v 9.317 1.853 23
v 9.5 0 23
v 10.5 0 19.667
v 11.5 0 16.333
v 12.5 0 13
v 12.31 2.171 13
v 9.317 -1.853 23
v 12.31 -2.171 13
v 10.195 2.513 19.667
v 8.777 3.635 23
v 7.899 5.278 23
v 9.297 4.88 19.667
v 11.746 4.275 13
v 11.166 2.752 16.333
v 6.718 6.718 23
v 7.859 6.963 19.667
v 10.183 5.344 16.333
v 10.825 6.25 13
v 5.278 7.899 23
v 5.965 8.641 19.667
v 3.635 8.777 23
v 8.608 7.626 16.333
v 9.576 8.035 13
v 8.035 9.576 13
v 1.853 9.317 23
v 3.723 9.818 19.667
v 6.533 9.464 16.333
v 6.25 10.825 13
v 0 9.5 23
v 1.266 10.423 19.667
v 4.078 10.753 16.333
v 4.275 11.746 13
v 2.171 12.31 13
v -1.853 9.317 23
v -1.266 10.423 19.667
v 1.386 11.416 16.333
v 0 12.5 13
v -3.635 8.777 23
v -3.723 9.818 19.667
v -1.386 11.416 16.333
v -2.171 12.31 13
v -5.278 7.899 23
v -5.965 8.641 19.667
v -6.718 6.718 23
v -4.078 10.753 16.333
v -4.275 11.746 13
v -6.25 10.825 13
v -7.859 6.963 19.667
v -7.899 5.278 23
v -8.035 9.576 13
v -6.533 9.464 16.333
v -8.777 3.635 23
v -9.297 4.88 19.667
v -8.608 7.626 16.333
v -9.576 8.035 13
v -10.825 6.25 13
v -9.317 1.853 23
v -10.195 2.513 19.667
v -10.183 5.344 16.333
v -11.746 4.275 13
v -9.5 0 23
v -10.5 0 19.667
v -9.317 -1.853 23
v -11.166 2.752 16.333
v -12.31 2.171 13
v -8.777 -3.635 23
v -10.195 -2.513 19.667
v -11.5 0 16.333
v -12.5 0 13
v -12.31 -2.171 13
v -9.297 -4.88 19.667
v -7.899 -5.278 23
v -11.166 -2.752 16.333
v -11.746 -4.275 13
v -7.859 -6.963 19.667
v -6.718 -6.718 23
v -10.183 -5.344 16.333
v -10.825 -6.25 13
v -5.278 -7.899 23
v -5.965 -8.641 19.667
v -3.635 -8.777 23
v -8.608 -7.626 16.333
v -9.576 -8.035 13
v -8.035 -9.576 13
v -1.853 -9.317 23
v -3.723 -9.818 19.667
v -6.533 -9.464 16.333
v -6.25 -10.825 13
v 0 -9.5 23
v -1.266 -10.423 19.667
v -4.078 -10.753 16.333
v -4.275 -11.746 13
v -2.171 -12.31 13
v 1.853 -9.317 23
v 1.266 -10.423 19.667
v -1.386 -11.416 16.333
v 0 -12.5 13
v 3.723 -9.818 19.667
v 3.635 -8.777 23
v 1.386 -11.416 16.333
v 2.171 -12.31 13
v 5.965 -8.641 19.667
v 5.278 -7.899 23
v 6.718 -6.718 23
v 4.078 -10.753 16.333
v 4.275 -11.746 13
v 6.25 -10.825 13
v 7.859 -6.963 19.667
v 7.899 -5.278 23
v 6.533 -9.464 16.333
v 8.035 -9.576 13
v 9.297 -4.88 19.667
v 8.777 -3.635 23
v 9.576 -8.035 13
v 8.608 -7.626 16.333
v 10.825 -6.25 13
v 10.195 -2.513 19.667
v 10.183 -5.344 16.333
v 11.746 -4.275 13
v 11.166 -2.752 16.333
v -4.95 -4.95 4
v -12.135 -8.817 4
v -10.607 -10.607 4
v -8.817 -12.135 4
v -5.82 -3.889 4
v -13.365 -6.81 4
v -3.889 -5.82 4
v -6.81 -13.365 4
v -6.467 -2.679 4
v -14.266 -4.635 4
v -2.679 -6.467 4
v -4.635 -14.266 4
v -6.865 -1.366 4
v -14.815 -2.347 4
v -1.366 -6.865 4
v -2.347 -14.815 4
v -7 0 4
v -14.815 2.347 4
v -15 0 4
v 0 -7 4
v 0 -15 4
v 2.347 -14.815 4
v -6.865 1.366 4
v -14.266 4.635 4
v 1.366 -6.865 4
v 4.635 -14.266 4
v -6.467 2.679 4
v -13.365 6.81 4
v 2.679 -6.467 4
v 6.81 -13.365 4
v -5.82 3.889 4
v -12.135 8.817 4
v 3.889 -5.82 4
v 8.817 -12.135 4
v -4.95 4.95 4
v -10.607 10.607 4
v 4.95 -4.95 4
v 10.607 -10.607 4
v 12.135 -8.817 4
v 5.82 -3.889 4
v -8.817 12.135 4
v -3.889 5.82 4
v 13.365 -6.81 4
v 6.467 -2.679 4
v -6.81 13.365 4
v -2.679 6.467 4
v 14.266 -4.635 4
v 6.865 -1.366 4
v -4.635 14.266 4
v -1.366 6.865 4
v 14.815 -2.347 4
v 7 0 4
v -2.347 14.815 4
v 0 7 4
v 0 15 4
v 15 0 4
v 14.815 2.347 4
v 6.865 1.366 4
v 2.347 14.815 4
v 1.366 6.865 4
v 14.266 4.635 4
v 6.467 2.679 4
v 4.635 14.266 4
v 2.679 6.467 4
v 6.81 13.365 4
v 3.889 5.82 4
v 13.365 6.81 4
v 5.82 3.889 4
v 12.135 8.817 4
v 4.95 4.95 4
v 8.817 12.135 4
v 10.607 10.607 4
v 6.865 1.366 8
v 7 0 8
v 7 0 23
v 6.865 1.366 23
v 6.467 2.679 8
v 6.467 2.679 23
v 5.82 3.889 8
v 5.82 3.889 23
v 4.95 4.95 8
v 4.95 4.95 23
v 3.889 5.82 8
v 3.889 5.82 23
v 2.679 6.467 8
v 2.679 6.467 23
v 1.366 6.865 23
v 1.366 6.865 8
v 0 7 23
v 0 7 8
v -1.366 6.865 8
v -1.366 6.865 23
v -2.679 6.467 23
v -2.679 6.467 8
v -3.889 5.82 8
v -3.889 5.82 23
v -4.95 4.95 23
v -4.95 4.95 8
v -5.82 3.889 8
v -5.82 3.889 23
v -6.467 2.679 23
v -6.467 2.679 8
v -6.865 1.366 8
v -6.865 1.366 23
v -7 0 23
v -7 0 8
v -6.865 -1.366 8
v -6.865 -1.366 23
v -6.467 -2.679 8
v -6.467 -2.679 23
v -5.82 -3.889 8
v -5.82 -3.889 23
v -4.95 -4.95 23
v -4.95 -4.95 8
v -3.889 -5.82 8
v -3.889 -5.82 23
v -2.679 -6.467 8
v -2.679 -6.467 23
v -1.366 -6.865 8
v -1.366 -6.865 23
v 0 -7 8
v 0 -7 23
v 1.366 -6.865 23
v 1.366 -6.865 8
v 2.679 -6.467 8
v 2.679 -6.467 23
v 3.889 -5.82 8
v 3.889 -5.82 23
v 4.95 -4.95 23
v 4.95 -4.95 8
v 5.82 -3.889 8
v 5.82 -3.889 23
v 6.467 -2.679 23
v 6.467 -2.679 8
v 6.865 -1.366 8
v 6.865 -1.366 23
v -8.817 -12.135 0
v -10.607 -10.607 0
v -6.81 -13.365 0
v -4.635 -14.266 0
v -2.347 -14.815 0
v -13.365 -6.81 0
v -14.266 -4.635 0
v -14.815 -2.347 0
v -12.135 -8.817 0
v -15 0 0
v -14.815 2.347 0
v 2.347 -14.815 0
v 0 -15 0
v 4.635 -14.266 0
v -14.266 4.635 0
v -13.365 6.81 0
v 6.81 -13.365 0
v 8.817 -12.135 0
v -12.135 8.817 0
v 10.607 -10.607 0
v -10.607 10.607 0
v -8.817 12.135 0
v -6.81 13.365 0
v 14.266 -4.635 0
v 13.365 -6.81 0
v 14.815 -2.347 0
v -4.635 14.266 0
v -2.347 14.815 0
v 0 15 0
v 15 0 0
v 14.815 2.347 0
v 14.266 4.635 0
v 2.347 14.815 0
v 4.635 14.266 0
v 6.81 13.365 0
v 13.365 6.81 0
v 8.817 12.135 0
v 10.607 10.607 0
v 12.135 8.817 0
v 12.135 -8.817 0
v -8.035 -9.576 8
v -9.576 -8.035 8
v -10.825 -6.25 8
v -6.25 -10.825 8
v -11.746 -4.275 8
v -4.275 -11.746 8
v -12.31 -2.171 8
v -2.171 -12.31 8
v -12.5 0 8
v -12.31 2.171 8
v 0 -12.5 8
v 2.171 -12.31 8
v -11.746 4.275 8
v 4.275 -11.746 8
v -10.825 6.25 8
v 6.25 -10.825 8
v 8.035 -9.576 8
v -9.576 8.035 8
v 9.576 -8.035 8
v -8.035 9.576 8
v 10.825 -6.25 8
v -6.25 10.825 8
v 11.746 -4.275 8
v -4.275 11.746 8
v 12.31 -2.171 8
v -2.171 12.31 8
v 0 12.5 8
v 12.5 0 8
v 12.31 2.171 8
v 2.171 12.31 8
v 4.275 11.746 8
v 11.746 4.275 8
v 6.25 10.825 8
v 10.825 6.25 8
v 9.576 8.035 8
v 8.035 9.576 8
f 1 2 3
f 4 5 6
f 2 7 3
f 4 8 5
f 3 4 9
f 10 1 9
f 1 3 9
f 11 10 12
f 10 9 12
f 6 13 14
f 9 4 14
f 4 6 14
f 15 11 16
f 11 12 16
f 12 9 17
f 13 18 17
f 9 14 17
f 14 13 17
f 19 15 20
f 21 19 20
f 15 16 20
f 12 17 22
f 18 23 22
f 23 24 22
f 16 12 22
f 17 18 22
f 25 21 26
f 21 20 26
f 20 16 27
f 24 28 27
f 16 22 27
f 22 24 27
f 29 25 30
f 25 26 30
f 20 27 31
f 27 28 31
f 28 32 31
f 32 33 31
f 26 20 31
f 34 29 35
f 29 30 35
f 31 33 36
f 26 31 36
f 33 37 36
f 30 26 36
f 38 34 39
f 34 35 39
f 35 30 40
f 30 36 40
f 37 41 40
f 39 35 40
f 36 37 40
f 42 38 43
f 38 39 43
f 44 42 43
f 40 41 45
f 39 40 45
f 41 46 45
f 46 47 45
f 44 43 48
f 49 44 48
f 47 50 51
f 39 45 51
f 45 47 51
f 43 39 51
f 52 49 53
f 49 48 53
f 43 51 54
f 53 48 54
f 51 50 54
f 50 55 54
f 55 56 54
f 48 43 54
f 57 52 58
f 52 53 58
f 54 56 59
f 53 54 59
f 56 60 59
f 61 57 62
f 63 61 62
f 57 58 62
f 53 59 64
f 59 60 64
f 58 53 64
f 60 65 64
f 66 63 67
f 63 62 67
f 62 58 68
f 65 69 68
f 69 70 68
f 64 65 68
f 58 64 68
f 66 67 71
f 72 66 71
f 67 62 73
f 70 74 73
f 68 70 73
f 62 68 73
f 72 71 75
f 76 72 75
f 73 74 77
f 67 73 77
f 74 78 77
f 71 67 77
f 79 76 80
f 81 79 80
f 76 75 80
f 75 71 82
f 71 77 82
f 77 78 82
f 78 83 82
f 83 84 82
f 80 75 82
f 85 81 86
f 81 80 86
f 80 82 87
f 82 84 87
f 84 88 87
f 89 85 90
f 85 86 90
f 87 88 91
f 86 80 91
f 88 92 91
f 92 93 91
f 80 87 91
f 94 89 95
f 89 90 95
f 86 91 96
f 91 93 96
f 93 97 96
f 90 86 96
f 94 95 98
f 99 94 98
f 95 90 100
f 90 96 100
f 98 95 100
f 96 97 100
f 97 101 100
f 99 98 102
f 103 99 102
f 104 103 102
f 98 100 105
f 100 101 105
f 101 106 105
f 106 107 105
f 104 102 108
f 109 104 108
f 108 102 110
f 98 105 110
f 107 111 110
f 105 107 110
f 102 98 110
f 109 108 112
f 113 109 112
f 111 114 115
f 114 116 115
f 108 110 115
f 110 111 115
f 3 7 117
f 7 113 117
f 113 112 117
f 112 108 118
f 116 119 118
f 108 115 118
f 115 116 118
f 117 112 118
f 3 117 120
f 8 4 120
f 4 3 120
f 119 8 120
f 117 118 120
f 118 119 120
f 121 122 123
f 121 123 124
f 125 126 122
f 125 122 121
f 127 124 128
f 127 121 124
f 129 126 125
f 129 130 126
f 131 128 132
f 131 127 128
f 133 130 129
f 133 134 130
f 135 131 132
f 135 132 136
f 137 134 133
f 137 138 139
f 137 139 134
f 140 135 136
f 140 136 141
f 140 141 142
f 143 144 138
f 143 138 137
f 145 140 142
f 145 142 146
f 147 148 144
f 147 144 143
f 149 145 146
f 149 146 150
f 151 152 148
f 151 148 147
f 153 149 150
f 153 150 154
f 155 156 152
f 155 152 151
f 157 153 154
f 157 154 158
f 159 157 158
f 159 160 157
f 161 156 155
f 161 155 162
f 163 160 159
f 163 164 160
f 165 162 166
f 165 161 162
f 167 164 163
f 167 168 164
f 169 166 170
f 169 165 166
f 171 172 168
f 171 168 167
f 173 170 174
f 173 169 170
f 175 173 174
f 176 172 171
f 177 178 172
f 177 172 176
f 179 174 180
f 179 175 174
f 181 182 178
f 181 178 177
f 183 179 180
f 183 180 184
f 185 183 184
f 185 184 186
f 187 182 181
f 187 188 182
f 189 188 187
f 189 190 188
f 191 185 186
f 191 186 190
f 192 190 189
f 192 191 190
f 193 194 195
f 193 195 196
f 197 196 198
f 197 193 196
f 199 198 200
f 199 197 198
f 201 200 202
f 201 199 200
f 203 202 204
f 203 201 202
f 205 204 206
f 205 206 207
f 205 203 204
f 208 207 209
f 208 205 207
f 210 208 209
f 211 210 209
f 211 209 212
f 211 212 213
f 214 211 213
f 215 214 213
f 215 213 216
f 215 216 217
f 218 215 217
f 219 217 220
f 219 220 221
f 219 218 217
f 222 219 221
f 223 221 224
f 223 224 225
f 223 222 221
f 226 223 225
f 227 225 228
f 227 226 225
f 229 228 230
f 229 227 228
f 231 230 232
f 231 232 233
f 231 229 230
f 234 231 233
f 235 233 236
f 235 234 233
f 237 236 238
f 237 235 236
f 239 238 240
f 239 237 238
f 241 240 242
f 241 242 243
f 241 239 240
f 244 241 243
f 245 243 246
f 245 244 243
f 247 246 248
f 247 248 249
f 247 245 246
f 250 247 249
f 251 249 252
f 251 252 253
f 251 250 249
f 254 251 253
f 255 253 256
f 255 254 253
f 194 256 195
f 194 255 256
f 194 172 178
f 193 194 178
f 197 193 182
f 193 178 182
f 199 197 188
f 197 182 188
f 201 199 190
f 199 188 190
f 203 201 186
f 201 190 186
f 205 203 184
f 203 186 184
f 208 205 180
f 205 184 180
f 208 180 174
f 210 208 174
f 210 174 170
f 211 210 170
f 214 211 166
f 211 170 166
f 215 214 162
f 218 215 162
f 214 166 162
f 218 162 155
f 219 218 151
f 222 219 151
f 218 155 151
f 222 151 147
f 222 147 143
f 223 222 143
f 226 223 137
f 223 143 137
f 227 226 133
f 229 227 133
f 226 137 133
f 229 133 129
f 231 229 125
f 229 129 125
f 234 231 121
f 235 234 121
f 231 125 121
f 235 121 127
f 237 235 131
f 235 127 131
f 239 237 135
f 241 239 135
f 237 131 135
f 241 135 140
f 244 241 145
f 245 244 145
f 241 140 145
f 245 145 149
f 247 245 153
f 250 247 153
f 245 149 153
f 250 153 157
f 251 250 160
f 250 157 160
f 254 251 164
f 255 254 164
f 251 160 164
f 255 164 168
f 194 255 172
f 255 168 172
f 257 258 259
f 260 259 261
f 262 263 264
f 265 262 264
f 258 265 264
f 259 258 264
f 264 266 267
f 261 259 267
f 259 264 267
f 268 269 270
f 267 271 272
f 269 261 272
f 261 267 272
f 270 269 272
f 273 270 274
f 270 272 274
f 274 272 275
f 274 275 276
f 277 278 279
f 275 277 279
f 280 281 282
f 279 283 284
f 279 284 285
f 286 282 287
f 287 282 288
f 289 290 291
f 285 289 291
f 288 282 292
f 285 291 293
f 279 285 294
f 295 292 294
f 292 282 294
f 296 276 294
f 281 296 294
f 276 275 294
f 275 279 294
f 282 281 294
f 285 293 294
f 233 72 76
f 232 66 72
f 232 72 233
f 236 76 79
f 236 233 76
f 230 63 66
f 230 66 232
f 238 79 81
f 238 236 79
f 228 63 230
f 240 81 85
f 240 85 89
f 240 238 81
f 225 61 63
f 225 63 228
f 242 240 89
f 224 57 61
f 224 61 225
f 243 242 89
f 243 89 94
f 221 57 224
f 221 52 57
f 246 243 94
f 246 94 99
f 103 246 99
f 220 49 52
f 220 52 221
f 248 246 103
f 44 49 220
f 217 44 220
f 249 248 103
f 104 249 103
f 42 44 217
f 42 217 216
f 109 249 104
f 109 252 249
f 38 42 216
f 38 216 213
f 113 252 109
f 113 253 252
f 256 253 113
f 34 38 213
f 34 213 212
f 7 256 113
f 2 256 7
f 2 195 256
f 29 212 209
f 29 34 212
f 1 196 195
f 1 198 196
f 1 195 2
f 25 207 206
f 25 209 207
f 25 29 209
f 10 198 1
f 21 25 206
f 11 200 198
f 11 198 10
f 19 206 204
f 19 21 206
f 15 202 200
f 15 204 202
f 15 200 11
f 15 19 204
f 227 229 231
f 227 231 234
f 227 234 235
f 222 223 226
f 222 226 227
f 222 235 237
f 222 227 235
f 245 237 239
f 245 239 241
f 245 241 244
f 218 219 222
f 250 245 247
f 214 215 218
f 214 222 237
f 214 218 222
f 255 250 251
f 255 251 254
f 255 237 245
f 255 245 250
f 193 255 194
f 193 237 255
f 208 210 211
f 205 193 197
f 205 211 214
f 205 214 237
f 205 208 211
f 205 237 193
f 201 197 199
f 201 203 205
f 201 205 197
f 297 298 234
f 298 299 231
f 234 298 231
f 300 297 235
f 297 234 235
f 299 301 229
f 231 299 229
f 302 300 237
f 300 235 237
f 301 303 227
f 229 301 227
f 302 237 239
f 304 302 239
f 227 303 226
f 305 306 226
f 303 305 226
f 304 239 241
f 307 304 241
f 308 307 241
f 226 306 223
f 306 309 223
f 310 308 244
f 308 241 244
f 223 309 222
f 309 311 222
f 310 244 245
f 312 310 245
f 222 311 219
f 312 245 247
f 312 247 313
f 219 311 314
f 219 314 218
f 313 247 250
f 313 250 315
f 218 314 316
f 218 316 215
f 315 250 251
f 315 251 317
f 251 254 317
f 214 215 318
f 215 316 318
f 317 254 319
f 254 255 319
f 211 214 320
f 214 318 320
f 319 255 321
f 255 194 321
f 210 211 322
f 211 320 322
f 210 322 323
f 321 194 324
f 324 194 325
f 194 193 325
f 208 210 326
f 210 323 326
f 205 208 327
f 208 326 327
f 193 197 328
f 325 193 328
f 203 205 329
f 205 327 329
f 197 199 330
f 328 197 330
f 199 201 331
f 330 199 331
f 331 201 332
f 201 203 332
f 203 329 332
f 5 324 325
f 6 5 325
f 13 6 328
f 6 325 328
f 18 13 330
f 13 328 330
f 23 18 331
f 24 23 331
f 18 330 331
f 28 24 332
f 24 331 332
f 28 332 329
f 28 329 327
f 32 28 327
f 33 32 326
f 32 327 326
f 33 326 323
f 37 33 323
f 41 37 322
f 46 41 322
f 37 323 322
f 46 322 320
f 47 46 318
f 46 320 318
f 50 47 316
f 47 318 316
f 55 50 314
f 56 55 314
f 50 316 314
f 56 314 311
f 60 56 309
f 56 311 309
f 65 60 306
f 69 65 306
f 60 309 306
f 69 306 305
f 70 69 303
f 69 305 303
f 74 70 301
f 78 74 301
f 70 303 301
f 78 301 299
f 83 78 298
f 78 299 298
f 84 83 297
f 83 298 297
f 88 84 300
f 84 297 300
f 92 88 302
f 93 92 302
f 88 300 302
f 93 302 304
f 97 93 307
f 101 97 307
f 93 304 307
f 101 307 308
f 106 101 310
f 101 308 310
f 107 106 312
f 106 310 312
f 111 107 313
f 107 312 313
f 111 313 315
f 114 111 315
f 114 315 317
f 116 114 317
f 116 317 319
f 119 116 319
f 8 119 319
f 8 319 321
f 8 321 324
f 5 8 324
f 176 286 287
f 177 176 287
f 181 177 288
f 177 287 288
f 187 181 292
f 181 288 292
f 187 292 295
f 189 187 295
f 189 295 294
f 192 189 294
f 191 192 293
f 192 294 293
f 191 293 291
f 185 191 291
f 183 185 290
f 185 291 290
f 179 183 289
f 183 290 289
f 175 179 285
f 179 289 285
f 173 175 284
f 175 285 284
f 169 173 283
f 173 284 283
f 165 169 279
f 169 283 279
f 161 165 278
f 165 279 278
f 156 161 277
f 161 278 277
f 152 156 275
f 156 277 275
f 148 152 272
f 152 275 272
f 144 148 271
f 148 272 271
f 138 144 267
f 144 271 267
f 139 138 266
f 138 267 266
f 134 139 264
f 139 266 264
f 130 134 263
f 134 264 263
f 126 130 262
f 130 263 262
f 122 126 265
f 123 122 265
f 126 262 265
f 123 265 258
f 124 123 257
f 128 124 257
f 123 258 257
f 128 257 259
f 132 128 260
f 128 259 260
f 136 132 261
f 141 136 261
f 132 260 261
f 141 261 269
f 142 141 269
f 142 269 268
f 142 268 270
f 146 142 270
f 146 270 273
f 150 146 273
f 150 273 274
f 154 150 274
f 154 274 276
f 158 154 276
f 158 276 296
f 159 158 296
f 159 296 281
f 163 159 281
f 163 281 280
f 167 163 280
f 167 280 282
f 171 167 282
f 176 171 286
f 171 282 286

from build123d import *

# Parameters (mm, degrees)
F0_R     = 15
F1_DEPTH = 4
F2_R     = 7
F3_DEPTH = 4
F4_R     = 12.5
F4_R_2   = 7
F5_DEPTH = 15
F6_SIZE2 = 10
F6_SIZE  = 3


# Not quite as in the source:
# - a feature of the source that left no trace in its solid (it failed there, or was rolled back) is left out


with BuildPart() as f1:
    # F0 (on Top) → F1 (new body)
    with BuildSketch(Plane.XY):
        Circle(F0_R)
    extrude(amount=F1_DEPTH)

    # F2 (on face) → F3 (join)
    with BuildSketch(Plane.XY.offset(4)):
        Circle(F2_R)
    extrude(amount=F3_DEPTH)


with BuildPart() as f5:
    # F4 (on face) → F5 (new body)
    with BuildSketch(Plane.XY.offset(8)):
        Circle(F4_R)
        Circle(F4_R_2, mode=Mode.SUBTRACT)
    extrude(amount=F5_DEPTH)

    # F6
    f6_edges = [f5.edges().sort_by_distance(p)[0] for p in [
        (-12.5, 0, 23),
    ]]
    f6_side = f5.faces().sort_by_distance((-12.146447, 0, 23))[0]
    chamfer(f6_edges, length=F6_SIZE, length2=F6_SIZE2, reference=f6_side)


solid = Compound([f1.part, f5.part])
